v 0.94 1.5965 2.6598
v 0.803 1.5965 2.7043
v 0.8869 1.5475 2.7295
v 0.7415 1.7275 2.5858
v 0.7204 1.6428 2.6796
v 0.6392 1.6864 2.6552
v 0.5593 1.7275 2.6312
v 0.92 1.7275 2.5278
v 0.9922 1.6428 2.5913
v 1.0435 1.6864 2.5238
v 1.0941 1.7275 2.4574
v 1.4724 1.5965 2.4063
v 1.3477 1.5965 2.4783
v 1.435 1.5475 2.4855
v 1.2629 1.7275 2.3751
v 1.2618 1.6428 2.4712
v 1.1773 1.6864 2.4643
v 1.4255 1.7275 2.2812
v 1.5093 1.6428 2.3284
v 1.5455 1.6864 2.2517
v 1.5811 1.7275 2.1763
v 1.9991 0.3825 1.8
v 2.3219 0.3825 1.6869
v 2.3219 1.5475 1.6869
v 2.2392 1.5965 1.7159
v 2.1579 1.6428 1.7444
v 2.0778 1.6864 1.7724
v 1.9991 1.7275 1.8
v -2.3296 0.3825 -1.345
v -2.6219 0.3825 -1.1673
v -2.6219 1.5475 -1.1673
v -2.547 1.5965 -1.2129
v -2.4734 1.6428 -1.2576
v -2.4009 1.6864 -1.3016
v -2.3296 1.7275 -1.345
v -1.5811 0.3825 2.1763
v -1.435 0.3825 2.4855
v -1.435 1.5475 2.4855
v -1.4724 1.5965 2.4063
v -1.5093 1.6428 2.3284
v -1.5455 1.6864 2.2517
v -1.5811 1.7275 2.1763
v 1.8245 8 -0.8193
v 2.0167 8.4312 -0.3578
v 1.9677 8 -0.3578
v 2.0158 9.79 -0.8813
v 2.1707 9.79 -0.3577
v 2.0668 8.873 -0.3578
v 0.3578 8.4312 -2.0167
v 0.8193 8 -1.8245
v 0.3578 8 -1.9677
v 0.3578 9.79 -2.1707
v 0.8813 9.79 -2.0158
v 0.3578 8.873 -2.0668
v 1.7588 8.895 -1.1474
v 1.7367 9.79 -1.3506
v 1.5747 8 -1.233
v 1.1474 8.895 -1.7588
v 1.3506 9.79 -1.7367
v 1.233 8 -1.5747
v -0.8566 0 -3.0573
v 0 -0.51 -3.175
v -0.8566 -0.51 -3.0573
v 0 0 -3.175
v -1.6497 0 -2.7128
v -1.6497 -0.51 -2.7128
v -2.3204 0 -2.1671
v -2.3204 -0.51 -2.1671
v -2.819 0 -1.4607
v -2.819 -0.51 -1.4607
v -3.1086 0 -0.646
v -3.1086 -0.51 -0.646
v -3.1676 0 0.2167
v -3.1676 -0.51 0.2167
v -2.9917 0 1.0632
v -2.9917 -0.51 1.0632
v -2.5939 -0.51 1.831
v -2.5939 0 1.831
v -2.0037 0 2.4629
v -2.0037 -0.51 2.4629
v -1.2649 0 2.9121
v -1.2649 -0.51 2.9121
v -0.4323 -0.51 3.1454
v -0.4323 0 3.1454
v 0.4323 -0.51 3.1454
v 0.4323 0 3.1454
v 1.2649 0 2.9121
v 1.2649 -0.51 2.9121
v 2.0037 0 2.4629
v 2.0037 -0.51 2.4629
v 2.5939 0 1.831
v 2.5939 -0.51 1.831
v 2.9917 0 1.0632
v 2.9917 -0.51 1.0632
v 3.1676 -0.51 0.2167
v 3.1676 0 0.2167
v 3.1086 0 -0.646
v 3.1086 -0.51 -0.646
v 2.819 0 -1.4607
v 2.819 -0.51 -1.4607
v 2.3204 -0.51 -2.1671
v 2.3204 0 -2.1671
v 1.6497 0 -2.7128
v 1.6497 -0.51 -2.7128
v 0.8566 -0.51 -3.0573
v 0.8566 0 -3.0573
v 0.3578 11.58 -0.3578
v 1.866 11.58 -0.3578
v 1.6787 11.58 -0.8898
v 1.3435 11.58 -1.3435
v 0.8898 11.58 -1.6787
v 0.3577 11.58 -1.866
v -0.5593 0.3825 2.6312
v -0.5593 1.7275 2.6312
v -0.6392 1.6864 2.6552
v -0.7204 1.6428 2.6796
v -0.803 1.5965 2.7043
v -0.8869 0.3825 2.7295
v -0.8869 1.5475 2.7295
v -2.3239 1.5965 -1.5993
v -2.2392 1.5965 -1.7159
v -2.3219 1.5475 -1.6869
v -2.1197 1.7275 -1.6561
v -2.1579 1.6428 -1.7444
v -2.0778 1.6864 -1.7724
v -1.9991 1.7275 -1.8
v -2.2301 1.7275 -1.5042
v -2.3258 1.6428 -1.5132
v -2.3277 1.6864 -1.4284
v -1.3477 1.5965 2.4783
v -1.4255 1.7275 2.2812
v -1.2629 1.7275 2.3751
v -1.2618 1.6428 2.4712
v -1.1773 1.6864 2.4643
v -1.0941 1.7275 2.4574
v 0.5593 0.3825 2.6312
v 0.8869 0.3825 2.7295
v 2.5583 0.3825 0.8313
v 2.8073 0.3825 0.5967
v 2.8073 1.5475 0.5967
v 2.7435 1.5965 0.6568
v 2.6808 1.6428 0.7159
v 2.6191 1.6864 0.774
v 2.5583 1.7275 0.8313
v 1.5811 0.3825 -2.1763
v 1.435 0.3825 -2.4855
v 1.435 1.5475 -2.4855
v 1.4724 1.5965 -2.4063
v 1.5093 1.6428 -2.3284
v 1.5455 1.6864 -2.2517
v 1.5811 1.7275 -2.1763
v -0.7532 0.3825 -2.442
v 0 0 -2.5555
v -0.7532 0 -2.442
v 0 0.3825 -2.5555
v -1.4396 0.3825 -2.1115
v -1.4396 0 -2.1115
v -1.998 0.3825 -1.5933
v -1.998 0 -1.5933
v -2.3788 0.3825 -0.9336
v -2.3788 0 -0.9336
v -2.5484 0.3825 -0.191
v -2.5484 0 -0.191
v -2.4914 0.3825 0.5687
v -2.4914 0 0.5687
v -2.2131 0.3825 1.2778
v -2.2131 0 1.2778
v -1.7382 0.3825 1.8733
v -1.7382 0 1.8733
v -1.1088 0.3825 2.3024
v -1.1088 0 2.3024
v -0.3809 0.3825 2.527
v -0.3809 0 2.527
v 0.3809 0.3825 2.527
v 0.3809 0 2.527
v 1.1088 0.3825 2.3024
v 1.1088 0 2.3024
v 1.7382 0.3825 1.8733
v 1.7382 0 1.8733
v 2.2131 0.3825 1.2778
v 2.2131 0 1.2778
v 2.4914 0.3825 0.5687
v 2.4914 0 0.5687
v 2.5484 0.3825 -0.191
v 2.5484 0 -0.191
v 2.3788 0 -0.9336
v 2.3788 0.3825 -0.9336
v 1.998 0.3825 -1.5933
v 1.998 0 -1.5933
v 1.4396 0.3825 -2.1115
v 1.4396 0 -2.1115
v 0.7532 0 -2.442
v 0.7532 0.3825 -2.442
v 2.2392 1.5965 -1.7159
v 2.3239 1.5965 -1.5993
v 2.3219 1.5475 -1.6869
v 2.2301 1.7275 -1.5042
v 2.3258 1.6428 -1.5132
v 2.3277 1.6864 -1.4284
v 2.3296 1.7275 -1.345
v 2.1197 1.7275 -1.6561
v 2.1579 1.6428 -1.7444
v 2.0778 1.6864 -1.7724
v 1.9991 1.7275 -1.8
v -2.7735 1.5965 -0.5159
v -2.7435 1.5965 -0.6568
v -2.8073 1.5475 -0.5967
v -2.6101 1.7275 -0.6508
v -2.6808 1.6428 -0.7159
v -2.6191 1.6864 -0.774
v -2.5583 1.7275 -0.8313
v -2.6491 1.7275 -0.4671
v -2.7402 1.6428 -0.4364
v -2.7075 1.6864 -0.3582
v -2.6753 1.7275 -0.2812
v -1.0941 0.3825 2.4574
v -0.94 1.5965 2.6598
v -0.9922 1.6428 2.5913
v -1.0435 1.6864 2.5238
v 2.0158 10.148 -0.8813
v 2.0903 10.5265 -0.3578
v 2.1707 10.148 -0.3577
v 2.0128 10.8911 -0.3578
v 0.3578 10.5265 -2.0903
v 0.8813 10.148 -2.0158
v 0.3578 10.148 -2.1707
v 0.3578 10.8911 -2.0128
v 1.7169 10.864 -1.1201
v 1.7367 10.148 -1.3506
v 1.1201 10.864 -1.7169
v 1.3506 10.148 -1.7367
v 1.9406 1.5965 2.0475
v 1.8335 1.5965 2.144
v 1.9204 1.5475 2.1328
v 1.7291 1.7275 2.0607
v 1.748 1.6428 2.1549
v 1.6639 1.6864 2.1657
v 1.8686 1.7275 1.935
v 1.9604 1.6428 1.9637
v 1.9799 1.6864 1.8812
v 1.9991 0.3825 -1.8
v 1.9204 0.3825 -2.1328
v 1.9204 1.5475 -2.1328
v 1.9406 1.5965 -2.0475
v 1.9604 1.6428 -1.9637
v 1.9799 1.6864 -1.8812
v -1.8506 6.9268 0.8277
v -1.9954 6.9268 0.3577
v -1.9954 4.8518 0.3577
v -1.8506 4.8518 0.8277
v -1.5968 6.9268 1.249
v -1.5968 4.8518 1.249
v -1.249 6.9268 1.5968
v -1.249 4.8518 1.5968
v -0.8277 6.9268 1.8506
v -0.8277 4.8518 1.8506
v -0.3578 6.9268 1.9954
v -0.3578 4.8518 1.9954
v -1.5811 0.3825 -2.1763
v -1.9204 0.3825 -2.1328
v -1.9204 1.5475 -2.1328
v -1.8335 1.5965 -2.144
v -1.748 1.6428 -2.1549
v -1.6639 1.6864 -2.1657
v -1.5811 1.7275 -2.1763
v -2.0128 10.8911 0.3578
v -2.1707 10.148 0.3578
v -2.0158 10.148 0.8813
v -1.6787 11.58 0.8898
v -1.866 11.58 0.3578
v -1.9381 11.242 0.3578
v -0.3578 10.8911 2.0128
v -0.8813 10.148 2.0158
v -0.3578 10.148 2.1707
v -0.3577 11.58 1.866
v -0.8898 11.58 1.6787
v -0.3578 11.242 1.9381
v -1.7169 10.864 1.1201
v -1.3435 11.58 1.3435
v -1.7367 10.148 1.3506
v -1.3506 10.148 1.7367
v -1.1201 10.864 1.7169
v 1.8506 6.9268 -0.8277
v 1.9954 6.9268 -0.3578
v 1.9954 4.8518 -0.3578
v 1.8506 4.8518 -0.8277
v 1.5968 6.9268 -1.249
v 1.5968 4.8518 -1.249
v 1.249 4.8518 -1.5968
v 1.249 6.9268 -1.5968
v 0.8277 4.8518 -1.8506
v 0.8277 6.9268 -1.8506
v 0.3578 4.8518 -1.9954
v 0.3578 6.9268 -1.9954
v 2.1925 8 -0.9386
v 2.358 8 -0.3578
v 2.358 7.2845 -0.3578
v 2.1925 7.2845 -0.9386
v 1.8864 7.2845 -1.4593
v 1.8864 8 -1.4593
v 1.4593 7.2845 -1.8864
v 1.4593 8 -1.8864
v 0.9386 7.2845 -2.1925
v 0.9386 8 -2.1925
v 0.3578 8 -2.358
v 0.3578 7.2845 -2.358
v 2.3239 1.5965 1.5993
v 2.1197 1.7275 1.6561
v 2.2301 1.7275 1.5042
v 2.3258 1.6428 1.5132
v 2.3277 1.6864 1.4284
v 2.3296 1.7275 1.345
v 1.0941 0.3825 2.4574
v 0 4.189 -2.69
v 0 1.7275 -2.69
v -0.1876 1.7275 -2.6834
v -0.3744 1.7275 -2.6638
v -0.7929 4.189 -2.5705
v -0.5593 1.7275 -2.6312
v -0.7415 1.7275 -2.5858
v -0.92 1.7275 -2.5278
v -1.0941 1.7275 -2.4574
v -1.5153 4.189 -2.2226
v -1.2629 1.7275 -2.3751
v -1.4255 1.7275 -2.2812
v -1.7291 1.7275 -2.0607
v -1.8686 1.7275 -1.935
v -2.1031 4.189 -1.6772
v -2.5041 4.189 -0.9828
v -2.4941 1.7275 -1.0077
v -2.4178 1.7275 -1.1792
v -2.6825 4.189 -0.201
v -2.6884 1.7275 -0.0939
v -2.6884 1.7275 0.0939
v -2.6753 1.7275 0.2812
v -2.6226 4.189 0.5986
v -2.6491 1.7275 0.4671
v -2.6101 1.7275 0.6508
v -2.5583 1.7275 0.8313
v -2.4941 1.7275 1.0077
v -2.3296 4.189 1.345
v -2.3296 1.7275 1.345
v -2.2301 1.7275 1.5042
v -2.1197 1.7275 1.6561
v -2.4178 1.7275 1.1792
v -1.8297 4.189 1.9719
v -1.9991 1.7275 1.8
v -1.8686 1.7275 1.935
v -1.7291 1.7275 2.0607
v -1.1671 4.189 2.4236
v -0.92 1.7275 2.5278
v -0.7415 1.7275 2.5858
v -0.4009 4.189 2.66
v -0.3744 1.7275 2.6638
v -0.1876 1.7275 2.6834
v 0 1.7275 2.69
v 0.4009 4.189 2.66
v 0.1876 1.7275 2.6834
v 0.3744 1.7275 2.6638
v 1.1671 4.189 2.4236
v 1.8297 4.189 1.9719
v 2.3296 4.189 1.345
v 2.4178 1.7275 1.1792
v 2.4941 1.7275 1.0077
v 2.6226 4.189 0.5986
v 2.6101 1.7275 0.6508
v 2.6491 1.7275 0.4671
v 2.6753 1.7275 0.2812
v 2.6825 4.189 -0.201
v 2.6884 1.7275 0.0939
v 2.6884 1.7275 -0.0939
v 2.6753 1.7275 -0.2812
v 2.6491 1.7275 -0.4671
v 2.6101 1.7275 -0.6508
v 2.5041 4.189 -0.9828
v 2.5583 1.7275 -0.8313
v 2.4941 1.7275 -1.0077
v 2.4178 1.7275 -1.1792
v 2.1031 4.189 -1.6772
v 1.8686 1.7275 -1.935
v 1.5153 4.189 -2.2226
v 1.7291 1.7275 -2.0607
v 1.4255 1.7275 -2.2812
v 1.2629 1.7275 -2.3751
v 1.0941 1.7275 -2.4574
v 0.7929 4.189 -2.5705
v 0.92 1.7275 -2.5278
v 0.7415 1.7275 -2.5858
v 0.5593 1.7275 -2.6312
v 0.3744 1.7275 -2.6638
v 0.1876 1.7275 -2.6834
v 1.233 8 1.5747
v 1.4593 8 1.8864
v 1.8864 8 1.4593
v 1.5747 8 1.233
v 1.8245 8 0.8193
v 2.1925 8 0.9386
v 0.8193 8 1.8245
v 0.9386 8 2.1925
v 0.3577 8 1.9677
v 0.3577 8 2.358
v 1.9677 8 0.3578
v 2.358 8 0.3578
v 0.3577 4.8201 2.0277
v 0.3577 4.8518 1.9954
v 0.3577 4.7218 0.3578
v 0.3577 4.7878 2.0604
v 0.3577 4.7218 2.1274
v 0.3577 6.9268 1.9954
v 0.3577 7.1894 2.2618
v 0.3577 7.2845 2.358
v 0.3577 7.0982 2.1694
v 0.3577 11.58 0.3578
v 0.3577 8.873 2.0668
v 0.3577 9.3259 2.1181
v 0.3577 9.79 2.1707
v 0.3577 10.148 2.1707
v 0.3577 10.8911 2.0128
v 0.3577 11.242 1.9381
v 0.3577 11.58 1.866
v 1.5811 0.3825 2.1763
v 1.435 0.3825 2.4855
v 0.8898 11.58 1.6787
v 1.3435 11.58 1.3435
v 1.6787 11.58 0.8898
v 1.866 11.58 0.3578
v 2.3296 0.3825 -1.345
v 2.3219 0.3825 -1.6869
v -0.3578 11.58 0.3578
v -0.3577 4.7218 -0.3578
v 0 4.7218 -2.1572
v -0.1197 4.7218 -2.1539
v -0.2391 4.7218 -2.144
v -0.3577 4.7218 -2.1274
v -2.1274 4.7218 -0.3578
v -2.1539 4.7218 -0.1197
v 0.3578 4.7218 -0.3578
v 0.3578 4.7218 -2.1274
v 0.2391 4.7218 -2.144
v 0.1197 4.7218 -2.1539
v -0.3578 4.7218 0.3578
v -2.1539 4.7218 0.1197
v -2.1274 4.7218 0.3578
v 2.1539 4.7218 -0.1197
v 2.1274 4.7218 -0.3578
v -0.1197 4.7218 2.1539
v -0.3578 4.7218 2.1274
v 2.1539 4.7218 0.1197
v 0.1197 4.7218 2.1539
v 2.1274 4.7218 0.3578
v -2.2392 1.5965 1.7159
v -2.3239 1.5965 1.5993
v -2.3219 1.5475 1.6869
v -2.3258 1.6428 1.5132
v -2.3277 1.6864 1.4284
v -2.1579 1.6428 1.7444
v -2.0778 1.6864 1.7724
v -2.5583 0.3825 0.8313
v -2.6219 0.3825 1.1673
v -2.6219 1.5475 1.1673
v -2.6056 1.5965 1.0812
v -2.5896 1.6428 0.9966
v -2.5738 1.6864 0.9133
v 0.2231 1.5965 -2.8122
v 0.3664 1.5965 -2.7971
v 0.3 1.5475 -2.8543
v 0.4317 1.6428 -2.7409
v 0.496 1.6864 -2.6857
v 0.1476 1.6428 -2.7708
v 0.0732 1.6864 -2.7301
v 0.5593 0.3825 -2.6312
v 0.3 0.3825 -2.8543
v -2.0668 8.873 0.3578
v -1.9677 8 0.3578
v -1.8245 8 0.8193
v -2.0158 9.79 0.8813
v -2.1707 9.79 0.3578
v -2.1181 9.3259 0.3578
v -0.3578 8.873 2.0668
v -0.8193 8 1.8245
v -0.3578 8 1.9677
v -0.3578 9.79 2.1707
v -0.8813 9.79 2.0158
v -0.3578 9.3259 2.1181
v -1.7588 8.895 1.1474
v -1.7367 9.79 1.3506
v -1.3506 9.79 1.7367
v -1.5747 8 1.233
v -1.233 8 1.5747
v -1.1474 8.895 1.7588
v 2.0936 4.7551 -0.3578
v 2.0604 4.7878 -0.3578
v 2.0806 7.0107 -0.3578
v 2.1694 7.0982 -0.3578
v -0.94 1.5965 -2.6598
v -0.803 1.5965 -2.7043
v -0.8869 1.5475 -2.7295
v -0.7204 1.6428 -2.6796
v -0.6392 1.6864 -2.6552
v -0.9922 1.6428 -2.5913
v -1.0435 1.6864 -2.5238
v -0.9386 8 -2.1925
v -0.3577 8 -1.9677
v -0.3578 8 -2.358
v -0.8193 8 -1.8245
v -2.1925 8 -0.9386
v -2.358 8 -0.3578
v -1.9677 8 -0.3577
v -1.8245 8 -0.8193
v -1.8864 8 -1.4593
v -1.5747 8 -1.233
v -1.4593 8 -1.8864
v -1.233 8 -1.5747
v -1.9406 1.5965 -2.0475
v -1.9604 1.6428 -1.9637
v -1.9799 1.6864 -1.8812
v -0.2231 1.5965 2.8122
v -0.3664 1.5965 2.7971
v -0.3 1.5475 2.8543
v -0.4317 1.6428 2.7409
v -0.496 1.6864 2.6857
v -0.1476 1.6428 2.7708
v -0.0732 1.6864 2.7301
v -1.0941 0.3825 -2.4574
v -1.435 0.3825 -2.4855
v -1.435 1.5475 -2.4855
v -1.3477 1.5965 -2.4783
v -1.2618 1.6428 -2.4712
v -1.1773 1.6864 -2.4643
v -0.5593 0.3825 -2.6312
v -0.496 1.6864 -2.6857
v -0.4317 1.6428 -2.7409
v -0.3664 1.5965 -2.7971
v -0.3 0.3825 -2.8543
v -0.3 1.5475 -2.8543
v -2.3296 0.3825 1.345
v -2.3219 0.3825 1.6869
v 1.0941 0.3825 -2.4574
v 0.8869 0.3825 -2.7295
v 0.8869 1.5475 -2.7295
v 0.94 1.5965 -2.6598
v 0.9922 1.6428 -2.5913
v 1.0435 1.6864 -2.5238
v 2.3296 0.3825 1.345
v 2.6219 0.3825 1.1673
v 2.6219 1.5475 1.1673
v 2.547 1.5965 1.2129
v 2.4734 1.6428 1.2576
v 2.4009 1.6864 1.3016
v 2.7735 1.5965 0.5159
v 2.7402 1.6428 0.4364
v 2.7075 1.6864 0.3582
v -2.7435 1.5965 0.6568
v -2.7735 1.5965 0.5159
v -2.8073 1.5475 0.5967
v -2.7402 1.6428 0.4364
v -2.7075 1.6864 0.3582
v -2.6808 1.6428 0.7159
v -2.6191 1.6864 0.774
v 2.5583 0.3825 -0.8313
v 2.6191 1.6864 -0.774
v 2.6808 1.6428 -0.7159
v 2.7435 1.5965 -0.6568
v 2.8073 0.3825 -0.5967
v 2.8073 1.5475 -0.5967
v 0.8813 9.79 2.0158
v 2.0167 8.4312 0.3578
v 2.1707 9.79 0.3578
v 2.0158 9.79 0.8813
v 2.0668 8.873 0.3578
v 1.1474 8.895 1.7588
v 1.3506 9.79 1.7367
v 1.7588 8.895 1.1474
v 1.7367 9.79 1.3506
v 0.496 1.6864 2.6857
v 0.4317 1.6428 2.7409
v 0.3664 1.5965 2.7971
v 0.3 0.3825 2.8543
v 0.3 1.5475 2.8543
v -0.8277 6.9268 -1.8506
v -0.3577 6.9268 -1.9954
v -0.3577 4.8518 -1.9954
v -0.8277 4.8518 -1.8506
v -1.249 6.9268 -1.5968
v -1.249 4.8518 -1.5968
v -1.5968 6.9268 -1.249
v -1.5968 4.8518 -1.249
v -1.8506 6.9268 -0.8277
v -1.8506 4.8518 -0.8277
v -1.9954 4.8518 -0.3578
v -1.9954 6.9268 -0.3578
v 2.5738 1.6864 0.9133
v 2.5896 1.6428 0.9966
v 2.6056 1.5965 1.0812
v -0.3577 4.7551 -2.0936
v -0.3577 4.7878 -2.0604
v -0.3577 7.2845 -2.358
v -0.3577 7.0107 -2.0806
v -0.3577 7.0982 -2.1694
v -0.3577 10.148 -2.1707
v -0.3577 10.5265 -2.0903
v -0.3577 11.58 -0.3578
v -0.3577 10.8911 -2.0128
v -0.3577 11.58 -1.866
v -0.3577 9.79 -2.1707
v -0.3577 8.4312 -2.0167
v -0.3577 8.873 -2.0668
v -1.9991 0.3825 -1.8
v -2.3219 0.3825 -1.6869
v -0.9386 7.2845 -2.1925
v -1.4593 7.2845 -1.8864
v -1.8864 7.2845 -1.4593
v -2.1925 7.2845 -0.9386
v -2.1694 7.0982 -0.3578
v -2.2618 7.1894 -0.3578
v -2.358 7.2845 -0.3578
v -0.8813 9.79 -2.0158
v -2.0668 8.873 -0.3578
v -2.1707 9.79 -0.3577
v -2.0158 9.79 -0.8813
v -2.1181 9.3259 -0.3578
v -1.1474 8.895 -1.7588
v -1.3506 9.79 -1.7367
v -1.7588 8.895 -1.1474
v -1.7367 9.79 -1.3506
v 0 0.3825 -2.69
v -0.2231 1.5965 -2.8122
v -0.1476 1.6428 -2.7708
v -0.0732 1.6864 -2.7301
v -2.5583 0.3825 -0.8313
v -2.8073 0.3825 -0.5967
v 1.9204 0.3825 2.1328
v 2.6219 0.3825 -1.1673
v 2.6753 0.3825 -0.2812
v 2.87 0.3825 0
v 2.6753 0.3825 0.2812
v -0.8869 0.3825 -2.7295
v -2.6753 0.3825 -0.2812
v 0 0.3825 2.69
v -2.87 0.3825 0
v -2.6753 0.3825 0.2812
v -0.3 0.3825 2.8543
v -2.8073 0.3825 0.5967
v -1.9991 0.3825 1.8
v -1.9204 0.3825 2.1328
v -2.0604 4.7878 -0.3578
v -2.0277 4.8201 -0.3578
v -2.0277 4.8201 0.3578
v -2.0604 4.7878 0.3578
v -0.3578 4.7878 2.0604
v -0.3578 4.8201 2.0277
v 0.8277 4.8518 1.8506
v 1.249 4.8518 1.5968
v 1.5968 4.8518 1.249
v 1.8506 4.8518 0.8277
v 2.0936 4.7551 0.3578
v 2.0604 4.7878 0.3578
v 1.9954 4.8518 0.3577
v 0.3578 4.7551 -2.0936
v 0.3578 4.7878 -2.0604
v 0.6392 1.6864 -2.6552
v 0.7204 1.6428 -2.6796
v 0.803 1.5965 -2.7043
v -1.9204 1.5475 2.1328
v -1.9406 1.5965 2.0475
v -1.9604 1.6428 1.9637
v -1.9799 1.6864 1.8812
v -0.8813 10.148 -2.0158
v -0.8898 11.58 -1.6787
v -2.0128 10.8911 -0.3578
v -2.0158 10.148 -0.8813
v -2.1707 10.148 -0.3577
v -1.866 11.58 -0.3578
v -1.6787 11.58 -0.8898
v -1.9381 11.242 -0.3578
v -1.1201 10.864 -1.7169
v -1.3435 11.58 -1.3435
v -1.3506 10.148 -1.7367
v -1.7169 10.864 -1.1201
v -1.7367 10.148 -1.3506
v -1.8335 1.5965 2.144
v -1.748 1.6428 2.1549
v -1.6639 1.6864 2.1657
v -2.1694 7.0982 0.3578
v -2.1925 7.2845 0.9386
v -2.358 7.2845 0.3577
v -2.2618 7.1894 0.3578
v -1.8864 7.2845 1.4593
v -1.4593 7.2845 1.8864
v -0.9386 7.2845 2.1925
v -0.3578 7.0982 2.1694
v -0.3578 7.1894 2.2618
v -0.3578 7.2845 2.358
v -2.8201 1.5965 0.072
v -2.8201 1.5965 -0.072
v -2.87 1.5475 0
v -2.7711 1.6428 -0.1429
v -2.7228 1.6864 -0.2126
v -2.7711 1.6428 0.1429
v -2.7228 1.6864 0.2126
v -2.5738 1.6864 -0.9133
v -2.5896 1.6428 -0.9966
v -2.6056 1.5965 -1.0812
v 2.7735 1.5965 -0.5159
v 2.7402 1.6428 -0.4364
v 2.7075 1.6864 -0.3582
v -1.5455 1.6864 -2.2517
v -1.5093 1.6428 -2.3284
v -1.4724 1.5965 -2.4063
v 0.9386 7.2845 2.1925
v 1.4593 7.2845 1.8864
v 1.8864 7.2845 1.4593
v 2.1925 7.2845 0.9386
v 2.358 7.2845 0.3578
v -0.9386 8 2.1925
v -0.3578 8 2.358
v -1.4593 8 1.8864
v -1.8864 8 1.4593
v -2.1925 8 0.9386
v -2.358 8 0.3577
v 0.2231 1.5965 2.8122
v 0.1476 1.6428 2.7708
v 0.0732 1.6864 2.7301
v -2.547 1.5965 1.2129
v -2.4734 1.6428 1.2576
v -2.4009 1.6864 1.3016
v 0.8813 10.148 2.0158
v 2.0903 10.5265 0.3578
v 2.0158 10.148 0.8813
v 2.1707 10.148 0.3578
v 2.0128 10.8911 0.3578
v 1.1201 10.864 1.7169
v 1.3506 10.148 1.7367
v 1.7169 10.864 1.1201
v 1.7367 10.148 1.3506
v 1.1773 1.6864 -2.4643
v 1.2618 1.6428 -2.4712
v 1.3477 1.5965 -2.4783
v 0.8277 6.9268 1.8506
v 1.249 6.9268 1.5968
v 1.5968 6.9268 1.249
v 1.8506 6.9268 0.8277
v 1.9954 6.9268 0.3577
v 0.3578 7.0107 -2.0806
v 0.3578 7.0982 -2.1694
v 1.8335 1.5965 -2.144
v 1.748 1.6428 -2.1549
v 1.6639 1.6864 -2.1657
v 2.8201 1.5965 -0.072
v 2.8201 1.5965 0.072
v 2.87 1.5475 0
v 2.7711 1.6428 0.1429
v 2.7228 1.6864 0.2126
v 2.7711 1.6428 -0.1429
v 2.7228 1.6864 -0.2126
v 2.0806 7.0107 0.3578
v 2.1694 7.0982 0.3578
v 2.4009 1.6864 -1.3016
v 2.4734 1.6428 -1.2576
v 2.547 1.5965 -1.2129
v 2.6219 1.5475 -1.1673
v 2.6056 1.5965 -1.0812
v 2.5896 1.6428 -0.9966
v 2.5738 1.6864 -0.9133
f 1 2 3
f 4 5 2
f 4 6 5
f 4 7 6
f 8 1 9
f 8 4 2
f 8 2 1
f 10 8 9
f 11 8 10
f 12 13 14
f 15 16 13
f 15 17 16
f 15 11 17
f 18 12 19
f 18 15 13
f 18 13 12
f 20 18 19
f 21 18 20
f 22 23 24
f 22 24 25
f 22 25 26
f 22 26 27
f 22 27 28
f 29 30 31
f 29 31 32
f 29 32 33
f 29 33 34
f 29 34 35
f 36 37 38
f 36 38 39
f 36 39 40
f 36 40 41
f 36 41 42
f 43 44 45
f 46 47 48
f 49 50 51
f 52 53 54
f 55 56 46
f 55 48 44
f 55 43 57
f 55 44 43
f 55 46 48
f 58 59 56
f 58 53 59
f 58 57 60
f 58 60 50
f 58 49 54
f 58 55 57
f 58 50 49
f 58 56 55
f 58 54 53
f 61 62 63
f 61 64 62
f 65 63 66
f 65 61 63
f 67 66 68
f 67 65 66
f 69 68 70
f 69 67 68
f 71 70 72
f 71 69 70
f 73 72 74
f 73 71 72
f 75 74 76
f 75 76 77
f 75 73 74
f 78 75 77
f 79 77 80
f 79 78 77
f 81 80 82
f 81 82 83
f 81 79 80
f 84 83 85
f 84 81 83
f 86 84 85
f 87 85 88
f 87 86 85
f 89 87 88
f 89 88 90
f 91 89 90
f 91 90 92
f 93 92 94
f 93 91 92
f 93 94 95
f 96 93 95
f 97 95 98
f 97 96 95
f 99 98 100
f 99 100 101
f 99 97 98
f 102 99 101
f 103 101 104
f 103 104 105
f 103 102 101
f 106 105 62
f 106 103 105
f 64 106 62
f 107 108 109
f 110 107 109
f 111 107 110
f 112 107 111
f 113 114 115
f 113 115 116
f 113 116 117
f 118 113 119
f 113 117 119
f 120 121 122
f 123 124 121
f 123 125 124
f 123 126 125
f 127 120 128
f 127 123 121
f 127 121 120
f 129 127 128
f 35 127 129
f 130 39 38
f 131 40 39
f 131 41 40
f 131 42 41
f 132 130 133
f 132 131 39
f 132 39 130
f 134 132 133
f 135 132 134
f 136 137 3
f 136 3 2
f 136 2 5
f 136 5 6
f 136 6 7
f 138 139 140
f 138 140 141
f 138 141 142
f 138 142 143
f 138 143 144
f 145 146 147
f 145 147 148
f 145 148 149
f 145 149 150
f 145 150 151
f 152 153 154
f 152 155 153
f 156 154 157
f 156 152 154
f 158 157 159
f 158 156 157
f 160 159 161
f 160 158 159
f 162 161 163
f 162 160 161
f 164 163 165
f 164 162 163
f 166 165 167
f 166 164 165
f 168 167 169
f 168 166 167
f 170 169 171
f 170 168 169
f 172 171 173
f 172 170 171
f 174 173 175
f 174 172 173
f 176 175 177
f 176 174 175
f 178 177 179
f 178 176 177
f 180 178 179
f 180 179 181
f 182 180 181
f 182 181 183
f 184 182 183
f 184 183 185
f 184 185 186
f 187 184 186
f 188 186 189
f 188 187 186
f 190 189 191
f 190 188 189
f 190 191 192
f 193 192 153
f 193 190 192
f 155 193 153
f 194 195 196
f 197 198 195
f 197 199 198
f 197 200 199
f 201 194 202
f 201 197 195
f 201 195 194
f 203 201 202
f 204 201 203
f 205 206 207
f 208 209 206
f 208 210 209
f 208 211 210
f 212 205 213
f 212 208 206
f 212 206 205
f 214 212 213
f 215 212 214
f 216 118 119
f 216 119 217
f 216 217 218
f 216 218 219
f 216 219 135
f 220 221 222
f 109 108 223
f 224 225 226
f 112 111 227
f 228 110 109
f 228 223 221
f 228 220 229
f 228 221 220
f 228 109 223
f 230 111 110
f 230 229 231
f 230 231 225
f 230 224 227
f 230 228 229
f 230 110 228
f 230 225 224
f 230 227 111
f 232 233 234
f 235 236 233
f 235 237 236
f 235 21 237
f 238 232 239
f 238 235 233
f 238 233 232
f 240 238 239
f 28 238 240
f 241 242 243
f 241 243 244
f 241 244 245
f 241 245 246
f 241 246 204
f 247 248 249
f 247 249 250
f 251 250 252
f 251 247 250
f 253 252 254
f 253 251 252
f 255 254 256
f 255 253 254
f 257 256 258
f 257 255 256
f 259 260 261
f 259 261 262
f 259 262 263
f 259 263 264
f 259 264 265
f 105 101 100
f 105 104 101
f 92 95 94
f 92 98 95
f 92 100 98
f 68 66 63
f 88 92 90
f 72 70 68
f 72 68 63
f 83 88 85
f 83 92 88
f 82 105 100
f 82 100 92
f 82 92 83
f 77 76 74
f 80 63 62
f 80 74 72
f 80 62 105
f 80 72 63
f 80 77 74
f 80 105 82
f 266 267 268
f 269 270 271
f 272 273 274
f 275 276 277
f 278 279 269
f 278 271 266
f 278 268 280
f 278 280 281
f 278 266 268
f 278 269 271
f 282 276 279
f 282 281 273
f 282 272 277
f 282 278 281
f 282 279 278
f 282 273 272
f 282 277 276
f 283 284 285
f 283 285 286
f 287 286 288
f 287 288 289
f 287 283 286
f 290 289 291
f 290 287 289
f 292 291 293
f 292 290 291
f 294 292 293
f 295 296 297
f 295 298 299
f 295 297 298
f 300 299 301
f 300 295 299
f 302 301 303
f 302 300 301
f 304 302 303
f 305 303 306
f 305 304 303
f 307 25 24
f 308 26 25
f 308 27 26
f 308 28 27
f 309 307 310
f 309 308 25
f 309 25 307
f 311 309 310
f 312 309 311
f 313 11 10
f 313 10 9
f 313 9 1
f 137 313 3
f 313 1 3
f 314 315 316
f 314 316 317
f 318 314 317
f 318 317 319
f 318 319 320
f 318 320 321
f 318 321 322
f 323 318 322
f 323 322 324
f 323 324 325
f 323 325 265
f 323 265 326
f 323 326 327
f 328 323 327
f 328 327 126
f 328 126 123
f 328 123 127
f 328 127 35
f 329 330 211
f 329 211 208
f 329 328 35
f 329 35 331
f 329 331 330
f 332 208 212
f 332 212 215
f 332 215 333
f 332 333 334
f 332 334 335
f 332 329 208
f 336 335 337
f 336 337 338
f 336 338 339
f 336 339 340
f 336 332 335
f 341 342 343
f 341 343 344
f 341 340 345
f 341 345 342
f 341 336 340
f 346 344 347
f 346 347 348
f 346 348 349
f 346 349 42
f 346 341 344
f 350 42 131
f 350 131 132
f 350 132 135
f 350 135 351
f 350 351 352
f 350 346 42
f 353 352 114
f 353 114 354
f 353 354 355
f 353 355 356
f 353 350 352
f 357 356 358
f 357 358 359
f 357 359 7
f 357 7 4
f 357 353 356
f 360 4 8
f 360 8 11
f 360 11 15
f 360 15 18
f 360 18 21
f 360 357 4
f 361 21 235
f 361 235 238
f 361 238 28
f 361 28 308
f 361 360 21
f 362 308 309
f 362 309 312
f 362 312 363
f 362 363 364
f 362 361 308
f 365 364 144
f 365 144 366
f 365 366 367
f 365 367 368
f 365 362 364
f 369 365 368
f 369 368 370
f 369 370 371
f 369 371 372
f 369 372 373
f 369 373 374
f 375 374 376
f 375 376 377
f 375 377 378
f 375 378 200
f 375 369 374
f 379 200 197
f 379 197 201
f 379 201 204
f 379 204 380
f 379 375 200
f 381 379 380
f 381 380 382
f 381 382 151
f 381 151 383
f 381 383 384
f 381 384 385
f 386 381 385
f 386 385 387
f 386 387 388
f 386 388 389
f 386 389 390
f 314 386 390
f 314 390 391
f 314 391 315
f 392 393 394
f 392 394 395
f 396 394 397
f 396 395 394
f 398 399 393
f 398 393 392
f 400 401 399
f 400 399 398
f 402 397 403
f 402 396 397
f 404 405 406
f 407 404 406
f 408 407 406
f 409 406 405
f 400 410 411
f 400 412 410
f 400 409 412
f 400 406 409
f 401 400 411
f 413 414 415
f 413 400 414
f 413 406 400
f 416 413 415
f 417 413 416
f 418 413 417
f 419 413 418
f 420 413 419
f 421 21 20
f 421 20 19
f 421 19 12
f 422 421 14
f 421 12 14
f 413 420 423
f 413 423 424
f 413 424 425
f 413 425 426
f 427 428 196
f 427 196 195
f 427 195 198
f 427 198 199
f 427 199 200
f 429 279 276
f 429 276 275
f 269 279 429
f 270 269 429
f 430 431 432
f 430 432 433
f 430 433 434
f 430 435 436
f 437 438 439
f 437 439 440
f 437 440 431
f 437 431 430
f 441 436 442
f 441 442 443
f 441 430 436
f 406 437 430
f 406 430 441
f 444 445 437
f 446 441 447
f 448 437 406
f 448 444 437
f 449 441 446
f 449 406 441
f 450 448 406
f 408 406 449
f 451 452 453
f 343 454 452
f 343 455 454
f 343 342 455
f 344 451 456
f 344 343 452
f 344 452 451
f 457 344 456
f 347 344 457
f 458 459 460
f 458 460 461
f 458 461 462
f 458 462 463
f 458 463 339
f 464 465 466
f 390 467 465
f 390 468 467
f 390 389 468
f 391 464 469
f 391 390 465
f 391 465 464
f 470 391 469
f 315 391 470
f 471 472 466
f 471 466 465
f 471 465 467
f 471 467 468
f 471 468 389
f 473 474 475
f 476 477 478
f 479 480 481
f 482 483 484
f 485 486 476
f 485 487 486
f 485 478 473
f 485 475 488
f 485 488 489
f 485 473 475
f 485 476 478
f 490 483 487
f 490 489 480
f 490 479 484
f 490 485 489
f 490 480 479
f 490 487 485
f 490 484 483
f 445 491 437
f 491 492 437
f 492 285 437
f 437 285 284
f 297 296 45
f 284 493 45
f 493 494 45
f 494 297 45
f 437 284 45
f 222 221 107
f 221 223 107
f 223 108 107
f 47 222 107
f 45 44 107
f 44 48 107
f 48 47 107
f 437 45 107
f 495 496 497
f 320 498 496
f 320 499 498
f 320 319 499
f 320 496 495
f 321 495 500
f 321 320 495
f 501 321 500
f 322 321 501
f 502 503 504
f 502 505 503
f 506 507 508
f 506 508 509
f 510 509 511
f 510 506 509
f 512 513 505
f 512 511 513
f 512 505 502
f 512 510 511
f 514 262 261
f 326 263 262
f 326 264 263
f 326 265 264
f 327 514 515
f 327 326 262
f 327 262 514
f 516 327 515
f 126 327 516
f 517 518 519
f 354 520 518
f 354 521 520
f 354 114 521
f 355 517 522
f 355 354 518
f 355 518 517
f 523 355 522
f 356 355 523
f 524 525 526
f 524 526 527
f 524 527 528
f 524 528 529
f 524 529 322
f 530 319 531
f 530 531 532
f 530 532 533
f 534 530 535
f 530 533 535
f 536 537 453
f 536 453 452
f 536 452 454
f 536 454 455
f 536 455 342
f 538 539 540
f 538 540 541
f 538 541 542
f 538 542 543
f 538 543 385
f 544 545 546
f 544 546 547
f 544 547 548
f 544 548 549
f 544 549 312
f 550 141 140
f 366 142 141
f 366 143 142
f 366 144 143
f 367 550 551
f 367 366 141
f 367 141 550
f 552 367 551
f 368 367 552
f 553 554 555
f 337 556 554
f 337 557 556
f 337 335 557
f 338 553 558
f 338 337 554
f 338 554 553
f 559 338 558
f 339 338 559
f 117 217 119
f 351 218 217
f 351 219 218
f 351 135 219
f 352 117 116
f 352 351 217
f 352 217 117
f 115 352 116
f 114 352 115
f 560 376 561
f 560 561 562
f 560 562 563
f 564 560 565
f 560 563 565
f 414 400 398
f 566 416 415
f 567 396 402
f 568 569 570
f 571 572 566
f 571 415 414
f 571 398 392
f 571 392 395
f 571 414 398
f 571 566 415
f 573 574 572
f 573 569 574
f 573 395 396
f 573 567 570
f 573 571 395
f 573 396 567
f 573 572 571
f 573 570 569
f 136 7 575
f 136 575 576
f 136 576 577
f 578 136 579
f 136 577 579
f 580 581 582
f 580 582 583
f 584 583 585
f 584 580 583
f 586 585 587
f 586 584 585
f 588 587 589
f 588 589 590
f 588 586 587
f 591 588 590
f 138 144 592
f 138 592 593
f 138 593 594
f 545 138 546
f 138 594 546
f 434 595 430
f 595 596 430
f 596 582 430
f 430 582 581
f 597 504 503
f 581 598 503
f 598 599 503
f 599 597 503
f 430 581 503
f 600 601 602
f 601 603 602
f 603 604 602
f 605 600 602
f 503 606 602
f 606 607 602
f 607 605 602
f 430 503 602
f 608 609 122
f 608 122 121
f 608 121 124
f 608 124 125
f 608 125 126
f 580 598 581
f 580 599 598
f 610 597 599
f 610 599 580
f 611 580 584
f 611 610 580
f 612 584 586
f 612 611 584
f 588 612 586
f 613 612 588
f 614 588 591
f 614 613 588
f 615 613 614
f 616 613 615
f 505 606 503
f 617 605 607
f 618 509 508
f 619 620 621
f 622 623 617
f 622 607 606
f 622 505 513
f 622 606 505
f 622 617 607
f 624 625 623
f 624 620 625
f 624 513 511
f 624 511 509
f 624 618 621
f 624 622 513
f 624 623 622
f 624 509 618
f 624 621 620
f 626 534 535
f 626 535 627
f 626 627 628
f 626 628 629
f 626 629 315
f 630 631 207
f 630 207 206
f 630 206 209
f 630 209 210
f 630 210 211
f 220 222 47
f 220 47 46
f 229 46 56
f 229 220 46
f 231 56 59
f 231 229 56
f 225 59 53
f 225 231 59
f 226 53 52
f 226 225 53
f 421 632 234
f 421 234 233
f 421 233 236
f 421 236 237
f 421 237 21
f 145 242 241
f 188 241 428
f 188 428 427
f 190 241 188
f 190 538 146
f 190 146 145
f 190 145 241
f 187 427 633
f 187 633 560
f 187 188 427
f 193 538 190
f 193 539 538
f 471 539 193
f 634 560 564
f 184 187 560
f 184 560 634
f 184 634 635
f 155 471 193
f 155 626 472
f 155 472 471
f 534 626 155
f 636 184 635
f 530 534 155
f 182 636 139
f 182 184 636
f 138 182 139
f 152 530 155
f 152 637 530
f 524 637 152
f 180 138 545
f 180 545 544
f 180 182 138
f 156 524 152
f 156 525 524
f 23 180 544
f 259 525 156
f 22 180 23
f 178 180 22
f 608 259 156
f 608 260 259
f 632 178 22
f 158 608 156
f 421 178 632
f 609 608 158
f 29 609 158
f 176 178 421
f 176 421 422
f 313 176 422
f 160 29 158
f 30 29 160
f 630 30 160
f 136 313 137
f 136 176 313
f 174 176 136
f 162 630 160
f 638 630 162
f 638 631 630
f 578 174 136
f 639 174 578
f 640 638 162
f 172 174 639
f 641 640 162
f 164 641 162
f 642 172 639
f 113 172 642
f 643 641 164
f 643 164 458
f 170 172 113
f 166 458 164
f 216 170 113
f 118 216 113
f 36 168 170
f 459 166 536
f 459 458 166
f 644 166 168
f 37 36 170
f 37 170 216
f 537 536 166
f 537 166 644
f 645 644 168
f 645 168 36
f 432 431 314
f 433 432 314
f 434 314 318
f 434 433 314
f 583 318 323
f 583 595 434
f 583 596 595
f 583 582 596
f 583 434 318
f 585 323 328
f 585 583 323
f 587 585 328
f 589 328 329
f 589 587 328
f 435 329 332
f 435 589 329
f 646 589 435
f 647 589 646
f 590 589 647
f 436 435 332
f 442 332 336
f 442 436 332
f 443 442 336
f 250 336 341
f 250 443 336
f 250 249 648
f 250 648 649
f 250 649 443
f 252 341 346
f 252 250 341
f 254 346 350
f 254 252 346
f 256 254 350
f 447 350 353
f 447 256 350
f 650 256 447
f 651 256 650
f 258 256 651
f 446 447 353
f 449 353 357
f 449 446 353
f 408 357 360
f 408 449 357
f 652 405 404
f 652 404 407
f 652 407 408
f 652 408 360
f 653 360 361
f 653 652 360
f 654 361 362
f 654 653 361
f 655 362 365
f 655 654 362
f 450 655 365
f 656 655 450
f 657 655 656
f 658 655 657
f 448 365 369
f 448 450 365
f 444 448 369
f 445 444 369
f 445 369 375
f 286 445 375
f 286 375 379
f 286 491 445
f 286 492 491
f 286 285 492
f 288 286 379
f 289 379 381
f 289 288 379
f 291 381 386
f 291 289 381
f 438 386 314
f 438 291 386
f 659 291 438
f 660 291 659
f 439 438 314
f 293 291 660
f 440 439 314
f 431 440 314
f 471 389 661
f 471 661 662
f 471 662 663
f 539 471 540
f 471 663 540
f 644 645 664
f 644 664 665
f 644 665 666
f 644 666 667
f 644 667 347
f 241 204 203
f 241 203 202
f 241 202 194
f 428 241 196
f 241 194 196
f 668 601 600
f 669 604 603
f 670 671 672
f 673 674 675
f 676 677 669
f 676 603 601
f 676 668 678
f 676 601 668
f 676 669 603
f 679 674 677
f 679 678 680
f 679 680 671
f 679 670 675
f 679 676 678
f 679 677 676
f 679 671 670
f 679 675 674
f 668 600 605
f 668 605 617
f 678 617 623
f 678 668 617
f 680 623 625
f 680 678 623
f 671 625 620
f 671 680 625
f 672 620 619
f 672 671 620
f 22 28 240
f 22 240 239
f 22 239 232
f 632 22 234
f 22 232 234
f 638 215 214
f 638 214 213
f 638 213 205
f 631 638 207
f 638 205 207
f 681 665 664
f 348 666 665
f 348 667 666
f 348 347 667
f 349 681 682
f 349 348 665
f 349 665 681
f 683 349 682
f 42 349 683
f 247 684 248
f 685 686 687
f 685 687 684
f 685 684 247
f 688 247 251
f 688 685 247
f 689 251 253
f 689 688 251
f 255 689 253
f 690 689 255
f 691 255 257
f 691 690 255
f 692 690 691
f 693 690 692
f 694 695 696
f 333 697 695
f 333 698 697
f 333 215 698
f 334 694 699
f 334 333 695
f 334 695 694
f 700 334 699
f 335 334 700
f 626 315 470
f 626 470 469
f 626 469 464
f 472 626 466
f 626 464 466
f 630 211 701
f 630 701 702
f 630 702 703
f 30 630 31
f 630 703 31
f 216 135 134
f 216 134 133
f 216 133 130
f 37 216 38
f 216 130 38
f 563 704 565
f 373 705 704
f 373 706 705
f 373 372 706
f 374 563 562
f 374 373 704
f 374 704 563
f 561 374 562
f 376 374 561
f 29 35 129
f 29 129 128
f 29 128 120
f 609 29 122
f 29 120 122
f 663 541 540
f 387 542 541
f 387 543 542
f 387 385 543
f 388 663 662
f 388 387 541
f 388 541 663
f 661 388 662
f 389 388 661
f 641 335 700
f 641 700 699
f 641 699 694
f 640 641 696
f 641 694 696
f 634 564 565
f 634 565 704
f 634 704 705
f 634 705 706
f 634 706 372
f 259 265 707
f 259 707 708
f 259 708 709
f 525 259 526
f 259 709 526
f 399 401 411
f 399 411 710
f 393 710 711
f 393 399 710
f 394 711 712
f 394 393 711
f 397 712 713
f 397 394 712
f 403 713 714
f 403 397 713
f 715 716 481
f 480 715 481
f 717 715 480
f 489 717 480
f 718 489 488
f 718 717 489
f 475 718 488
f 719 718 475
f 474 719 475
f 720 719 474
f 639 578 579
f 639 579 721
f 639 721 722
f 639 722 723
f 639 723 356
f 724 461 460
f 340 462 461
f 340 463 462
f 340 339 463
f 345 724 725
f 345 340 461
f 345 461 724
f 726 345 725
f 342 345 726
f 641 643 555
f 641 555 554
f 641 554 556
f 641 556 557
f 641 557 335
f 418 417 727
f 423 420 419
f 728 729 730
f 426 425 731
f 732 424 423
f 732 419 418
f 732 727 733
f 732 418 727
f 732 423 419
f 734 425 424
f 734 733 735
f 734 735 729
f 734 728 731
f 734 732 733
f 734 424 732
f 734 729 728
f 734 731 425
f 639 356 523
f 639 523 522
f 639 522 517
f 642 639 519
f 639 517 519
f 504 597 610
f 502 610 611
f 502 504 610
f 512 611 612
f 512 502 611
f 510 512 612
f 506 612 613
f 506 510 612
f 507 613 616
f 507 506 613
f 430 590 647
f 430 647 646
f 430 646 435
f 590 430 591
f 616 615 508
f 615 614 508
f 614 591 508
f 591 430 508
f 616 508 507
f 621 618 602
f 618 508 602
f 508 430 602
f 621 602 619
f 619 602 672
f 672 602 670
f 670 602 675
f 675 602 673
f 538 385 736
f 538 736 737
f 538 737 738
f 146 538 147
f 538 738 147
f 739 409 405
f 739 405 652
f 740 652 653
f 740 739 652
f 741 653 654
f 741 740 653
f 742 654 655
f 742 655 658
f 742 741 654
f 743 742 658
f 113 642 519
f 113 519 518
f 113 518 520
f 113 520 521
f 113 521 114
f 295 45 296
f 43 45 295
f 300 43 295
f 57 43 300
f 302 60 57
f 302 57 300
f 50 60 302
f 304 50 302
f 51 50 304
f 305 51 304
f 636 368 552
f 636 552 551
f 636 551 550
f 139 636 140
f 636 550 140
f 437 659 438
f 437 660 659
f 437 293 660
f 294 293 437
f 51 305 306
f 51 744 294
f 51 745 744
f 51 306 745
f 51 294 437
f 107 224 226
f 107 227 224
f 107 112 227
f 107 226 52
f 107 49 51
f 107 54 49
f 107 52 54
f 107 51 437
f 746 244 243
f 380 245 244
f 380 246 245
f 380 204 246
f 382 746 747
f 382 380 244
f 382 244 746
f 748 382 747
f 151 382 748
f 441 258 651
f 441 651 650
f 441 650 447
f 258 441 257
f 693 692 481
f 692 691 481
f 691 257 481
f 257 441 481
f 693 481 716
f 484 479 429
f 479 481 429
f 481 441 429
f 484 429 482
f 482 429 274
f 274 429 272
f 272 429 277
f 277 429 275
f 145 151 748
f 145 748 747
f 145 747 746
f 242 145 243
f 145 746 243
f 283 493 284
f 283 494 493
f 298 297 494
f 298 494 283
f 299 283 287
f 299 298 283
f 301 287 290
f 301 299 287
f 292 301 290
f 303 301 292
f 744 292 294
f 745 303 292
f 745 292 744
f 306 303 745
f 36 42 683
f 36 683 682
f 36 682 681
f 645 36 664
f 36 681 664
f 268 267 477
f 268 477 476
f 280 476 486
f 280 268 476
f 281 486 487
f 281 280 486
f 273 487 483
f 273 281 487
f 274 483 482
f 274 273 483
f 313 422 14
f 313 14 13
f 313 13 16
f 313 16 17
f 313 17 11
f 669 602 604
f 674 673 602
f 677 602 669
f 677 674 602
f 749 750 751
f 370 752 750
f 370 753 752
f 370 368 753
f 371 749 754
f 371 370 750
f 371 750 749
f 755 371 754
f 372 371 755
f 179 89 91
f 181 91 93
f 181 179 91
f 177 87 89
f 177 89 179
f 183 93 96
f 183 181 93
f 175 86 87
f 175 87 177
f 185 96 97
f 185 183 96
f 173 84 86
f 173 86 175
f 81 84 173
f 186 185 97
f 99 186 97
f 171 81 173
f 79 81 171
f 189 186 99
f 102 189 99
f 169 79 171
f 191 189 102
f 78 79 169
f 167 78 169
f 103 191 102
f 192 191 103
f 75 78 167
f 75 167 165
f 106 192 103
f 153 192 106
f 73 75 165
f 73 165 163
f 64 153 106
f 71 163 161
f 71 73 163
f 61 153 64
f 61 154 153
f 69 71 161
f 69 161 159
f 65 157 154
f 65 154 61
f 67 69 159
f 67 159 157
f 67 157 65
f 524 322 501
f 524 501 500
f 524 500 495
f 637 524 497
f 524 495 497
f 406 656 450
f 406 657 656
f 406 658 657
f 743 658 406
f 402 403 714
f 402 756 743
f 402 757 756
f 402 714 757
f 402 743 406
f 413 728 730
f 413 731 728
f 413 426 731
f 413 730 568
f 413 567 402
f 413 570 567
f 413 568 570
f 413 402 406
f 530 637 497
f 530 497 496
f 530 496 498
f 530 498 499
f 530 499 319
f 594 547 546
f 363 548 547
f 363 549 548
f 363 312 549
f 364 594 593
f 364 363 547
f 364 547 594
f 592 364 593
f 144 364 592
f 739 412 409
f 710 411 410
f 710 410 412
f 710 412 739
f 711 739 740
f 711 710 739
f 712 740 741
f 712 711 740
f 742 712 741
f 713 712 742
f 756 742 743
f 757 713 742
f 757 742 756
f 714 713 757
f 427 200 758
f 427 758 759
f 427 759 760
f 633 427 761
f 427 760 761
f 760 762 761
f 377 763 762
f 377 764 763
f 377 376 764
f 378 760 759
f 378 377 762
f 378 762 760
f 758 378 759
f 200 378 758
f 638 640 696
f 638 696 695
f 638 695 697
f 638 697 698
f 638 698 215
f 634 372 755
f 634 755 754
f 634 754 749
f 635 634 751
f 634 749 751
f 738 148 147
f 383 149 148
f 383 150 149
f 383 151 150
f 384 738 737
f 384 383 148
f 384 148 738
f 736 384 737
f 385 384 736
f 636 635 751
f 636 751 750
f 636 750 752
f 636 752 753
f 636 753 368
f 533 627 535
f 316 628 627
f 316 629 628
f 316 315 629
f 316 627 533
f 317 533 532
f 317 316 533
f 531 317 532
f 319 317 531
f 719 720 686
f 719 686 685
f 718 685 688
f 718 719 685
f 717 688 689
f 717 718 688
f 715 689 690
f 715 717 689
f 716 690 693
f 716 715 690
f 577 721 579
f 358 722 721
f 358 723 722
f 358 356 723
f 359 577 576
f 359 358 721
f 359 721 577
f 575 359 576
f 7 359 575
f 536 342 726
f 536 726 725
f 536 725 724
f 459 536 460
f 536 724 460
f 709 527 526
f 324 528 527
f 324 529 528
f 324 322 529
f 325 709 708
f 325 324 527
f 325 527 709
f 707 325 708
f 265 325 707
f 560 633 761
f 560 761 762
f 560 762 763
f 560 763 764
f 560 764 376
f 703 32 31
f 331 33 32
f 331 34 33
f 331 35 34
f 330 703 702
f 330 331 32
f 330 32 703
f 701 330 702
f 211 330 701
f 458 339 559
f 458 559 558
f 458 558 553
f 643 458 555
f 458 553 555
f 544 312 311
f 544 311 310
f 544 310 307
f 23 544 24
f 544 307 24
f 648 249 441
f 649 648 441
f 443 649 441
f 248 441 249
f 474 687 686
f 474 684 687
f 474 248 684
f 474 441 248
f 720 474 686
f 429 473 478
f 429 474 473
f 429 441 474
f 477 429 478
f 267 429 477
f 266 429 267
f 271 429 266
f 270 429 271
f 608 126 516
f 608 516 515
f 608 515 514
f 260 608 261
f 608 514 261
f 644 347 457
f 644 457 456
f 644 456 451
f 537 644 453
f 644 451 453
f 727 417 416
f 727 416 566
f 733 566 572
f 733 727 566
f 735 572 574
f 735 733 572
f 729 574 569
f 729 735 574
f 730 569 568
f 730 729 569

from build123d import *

# Parameters (mm, degrees)
SLITCUTSKE_W       = 5.33220965
SLITCUTSKE_H       = 0.7155
SLITCUT_DEPTH      = 6.8582
SLITCUTPAT_COUNT   = 2
SLITCUTPAT_ANGLE   = 90
CLINCHCUT_START    = -1.345
CLINCHCUT_DEPTH    = 1.345
CLINCHCUTPAT_COUNT = 30
CLINCHCUTPAT_ANGLE = 348


with BuildPart() as part:
    # BodySke → Body (revolve)
    with BuildSketch(Plane.XY, mode=Mode.PRIVATE) as body_sk:
        Polygon((2.5555, 0), (2.5555, 0.3825), (2.87, 0.3825), (2.87, 1.5475), (2.69, 1.7275), (2.69, 4.18905), (2.02725, 4.8518), (2.02725, 6.92675), (2.385, 7.2845), (2.385, 8), (2, 8), (2.2, 9.79), (2.2, 10.148), (1.9, 11.58), (0, 11.58), (0, -0.51), (3.175, -0.51), (3.175, 0), align=None)
    revolve(body_sk.sketch.rotate(Axis((0, -0.51, 0), (0, 1, 0)), 90), axis=Axis((0, -0.51, 0), (0, 1, 0)))

    # SlitCutSke → SlitCut (cut)
    with BuildSketch(Plane(origin=(0, 11.58, 0), x_dir=(-1, 0, 0), z_dir=(0, 1, 0))):
        Rectangle(SLITCUTSKE_W, SLITCUTSKE_H)
    slitcut = extrude(amount=-SLITCUT_DEPTH, mode=Mode.SUBTRACT)

    # SlitCutPat: SlitCut ×2 about axis
    slitcutpat_axis = Axis((0, -0.51, 0), (0, 1, 0))
    for i in range(1, SLITCUTPAT_COUNT):
        add(slitcut.rotate(slitcutpat_axis, i * SLITCUTPAT_ANGLE / (SLITCUTPAT_COUNT - 1)), mode=Mode.SUBTRACT)

    # CliRinCutSke → ClinchCut (cut)
    with BuildSketch(Plane.XZ.offset(-0.3825).offset(CLINCHCUT_START)):
        with BuildLine():
            Line((0.29999669, 2.85427784), (0, 2.69))
            Line((0, 2.69), (-0.29999669, 2.85427784))
            ThreePointArc((-0.29999669, 2.85427784), (0, 2.87), (0.29999669, 2.85427784))
        make_face()
    clinchcut = extrude(amount=CLINCHCUT_DEPTH, mode=Mode.SUBTRACT)

    # ClinchCutPat: ClinchCut ×30 about axis
    clinchcutpat_axis = Axis((0, -0.51, 0), (0, 1, 0))
    for i in range(1, CLINCHCUTPAT_COUNT):
        add(clinchcut.rotate(clinchcutpat_axis, i * CLINCHCUTPAT_ANGLE / (CLINCHCUTPAT_COUNT - 1)), mode=Mode.SUBTRACT)


solid = part.part
